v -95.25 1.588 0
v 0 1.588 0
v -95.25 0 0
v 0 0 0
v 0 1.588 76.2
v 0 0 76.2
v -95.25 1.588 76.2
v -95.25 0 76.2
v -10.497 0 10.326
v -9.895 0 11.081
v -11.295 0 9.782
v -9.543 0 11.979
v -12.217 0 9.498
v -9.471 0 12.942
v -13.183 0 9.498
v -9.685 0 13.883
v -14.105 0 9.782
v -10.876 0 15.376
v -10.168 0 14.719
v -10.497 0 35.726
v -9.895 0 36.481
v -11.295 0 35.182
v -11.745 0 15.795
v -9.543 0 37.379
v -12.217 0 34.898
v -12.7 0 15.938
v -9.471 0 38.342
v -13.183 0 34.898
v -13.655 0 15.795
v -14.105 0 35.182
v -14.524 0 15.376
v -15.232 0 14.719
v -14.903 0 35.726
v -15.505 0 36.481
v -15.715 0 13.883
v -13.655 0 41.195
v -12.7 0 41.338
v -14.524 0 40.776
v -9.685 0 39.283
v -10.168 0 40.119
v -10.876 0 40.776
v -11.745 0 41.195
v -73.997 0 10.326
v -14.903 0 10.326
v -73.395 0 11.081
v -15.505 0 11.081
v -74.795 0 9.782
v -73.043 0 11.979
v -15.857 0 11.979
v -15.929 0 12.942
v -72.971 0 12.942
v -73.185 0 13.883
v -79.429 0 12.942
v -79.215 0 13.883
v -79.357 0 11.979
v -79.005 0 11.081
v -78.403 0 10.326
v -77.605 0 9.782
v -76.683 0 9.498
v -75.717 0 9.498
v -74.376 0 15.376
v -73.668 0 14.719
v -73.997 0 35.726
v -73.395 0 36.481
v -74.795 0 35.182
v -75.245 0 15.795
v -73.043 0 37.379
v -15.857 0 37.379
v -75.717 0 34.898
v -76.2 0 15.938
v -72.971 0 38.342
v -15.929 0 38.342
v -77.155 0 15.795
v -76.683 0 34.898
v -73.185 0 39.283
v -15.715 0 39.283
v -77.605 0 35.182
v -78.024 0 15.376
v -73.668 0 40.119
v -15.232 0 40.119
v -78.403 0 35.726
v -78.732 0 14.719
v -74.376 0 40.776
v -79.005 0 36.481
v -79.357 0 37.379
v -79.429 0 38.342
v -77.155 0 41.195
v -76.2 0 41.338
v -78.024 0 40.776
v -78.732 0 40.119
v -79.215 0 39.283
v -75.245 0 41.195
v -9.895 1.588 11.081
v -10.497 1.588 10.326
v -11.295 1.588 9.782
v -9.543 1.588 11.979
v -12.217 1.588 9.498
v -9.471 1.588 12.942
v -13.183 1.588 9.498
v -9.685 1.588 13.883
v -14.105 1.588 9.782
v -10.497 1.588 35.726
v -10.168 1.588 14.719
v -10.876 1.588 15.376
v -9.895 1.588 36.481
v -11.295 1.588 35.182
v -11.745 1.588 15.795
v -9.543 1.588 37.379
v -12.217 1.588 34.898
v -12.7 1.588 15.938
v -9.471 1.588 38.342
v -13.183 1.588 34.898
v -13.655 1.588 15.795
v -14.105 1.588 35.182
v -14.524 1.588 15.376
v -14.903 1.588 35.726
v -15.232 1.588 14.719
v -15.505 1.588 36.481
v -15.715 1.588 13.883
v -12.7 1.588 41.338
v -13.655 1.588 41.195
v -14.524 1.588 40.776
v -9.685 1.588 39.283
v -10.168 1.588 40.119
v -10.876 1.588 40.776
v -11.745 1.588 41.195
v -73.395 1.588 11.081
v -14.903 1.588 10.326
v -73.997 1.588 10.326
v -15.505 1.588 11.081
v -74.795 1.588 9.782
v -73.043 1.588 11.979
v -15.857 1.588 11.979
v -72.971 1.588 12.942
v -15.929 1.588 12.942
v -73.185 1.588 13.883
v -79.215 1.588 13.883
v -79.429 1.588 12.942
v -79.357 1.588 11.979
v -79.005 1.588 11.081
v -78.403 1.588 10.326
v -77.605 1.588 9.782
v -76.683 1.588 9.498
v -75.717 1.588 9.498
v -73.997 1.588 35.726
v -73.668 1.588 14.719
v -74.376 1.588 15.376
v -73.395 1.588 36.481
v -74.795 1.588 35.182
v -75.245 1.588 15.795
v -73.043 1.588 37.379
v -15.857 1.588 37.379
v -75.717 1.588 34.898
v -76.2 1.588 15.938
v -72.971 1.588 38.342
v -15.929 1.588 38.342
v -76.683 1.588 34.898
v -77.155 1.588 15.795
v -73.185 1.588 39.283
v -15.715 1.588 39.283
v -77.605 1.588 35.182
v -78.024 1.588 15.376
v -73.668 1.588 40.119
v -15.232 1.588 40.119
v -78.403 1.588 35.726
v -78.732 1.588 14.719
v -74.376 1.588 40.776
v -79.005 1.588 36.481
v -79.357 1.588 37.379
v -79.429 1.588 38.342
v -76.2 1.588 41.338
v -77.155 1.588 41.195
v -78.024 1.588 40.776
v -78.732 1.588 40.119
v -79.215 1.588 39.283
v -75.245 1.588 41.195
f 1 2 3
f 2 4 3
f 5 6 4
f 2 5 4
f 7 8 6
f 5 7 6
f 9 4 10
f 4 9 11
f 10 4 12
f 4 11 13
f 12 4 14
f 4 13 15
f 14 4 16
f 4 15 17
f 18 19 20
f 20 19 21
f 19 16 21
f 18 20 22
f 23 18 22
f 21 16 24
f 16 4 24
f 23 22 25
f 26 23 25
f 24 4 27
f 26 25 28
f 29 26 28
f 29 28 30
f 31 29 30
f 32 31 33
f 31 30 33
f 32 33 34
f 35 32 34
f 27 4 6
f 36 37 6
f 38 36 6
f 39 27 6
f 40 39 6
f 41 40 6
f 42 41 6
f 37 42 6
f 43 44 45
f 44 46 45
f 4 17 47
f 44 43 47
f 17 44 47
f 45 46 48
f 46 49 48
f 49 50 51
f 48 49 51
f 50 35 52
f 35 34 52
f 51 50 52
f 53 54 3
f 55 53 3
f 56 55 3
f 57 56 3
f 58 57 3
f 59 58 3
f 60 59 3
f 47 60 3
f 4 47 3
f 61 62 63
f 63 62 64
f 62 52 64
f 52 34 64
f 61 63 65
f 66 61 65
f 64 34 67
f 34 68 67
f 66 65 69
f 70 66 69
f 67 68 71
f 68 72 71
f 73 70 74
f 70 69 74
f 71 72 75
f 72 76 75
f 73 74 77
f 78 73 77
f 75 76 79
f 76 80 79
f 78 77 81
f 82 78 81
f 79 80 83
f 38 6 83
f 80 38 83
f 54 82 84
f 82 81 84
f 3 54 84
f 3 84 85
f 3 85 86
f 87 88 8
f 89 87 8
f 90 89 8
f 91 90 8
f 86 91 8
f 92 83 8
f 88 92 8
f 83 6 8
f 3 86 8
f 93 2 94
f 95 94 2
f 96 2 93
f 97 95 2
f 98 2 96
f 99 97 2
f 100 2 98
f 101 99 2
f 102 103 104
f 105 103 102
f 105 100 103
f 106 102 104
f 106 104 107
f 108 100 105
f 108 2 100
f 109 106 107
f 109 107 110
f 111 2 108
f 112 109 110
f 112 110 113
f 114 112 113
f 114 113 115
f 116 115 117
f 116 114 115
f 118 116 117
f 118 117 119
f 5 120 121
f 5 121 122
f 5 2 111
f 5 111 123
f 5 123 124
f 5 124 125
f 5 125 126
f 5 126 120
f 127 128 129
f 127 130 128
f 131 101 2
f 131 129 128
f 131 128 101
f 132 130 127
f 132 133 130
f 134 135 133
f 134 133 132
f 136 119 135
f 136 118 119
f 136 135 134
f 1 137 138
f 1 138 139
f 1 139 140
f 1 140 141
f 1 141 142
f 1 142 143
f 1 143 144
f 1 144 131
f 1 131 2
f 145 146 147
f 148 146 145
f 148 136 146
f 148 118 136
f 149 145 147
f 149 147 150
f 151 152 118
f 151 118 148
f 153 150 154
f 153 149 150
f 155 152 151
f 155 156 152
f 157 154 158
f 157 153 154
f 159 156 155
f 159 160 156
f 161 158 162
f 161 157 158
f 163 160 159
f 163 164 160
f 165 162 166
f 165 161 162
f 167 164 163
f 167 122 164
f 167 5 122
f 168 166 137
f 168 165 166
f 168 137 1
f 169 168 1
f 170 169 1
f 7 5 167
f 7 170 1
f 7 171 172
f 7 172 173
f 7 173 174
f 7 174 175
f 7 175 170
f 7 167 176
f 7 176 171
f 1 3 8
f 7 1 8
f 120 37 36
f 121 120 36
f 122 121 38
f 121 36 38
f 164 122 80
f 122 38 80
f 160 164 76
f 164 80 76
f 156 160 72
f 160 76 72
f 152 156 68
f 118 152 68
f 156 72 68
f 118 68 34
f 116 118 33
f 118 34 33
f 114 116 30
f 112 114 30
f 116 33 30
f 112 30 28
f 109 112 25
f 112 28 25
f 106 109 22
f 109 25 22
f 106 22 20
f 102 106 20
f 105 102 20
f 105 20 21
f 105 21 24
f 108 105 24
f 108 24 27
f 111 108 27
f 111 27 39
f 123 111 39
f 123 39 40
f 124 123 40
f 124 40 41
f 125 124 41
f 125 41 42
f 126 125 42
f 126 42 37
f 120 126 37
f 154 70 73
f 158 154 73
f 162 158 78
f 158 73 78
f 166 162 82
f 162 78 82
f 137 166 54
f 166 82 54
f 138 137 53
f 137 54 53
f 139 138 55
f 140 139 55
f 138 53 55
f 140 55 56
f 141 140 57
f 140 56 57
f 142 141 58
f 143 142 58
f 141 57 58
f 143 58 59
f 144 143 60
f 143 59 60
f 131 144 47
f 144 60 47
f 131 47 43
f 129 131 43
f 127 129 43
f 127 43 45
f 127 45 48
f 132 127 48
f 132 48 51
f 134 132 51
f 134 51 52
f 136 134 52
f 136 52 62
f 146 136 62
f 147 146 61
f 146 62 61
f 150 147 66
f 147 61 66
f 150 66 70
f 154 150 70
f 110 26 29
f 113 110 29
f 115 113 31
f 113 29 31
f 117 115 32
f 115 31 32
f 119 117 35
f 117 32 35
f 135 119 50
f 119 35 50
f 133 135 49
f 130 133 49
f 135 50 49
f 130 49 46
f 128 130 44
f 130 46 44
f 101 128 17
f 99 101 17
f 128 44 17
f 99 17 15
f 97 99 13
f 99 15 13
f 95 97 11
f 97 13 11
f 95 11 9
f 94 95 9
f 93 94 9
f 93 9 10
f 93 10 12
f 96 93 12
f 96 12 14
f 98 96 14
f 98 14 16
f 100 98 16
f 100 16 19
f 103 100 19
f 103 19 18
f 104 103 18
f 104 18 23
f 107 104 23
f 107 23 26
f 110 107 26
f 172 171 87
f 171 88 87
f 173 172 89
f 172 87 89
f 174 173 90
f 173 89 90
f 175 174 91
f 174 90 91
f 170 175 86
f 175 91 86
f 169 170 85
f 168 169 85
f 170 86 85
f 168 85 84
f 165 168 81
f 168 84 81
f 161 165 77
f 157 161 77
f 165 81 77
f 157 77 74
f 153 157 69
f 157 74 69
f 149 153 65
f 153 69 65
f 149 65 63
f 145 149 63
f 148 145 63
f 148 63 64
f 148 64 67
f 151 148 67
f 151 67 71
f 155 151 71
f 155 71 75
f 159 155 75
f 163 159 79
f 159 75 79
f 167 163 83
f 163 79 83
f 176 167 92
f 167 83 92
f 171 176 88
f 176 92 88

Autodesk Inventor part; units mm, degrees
ref_plane "YZ Plane" through (0, 0, 0) normal (1, 0, 0) x (0, 1, 0)
ref_plane "XZ Plane" through (0, 0, 0) normal (0, 1, 0) x (-1, 0, 0)
ref_plane "XY Plane" through (0, 0, 0) normal (0, 0, 1) x (1, 0, 0)
sketch "Sketch1" plane through (0, 0, 0) normal (0, 1, 0) x (-1, 0, 0)
  line L0 (0, 0) -> (95.25, 0)
  line L1 (95.25, 0) -> (95.25, 76.2)
  line L2 (95.25, 76.2) -> (0, 76.2)
  line L3 (0, 76.2) -> (0, 0)
  point P0 (76.2, 12.7)
  point P1 (12.7, 13.1017)
  point P2 (76.2, 38.1)
  point P3 (12.7, 38.1)
  dimension "d0" = 95.25
  dimension "d1" = 76.2
  dimension "d14" = 12.7
  dimension "d15" = 19.05
  dimension "d16" = 63.5
  dimension "d29" = 19.05
  dimension "d30" = 38.1
  dimension "d31" = 63.5
extrude "Extrusion2" add sketch "Sketch1" along normal blind 1.5875
sketch "Sketch3" plane through (0, 1.5875, 0) normal (0, 1, 0) x (1, 0, 0)
  line L0 (0, 0) -> (-95.25, 0) projected
  line L1 (-95.25, 0) -> (-95.25, -76.2) projected
  point P0 (-76.2, -12.7)
  point P1 (-12.7, -12.7)
  point P2 (-76.2, -38.1)
  point P3 (-12.7, -38.1)
  dimension "d19" = 19.05
  dimension "d20" = 12.7
  dimension "d21" = 63.5
  dimension "d32" = 25.4
  dimension "d33" = 63.5
  dimension "d34" = 19.05
hole "Hole3" at (-76.2, 1.5875, 12.7) at (-12.7, 1.5875, 12.7) at (-76.2, 1.5875, 38.1) at (-12.7, 1.5875, 38.1) direction (0, -1, 0) diameter 6.477 end through all
properties part number "slider"
